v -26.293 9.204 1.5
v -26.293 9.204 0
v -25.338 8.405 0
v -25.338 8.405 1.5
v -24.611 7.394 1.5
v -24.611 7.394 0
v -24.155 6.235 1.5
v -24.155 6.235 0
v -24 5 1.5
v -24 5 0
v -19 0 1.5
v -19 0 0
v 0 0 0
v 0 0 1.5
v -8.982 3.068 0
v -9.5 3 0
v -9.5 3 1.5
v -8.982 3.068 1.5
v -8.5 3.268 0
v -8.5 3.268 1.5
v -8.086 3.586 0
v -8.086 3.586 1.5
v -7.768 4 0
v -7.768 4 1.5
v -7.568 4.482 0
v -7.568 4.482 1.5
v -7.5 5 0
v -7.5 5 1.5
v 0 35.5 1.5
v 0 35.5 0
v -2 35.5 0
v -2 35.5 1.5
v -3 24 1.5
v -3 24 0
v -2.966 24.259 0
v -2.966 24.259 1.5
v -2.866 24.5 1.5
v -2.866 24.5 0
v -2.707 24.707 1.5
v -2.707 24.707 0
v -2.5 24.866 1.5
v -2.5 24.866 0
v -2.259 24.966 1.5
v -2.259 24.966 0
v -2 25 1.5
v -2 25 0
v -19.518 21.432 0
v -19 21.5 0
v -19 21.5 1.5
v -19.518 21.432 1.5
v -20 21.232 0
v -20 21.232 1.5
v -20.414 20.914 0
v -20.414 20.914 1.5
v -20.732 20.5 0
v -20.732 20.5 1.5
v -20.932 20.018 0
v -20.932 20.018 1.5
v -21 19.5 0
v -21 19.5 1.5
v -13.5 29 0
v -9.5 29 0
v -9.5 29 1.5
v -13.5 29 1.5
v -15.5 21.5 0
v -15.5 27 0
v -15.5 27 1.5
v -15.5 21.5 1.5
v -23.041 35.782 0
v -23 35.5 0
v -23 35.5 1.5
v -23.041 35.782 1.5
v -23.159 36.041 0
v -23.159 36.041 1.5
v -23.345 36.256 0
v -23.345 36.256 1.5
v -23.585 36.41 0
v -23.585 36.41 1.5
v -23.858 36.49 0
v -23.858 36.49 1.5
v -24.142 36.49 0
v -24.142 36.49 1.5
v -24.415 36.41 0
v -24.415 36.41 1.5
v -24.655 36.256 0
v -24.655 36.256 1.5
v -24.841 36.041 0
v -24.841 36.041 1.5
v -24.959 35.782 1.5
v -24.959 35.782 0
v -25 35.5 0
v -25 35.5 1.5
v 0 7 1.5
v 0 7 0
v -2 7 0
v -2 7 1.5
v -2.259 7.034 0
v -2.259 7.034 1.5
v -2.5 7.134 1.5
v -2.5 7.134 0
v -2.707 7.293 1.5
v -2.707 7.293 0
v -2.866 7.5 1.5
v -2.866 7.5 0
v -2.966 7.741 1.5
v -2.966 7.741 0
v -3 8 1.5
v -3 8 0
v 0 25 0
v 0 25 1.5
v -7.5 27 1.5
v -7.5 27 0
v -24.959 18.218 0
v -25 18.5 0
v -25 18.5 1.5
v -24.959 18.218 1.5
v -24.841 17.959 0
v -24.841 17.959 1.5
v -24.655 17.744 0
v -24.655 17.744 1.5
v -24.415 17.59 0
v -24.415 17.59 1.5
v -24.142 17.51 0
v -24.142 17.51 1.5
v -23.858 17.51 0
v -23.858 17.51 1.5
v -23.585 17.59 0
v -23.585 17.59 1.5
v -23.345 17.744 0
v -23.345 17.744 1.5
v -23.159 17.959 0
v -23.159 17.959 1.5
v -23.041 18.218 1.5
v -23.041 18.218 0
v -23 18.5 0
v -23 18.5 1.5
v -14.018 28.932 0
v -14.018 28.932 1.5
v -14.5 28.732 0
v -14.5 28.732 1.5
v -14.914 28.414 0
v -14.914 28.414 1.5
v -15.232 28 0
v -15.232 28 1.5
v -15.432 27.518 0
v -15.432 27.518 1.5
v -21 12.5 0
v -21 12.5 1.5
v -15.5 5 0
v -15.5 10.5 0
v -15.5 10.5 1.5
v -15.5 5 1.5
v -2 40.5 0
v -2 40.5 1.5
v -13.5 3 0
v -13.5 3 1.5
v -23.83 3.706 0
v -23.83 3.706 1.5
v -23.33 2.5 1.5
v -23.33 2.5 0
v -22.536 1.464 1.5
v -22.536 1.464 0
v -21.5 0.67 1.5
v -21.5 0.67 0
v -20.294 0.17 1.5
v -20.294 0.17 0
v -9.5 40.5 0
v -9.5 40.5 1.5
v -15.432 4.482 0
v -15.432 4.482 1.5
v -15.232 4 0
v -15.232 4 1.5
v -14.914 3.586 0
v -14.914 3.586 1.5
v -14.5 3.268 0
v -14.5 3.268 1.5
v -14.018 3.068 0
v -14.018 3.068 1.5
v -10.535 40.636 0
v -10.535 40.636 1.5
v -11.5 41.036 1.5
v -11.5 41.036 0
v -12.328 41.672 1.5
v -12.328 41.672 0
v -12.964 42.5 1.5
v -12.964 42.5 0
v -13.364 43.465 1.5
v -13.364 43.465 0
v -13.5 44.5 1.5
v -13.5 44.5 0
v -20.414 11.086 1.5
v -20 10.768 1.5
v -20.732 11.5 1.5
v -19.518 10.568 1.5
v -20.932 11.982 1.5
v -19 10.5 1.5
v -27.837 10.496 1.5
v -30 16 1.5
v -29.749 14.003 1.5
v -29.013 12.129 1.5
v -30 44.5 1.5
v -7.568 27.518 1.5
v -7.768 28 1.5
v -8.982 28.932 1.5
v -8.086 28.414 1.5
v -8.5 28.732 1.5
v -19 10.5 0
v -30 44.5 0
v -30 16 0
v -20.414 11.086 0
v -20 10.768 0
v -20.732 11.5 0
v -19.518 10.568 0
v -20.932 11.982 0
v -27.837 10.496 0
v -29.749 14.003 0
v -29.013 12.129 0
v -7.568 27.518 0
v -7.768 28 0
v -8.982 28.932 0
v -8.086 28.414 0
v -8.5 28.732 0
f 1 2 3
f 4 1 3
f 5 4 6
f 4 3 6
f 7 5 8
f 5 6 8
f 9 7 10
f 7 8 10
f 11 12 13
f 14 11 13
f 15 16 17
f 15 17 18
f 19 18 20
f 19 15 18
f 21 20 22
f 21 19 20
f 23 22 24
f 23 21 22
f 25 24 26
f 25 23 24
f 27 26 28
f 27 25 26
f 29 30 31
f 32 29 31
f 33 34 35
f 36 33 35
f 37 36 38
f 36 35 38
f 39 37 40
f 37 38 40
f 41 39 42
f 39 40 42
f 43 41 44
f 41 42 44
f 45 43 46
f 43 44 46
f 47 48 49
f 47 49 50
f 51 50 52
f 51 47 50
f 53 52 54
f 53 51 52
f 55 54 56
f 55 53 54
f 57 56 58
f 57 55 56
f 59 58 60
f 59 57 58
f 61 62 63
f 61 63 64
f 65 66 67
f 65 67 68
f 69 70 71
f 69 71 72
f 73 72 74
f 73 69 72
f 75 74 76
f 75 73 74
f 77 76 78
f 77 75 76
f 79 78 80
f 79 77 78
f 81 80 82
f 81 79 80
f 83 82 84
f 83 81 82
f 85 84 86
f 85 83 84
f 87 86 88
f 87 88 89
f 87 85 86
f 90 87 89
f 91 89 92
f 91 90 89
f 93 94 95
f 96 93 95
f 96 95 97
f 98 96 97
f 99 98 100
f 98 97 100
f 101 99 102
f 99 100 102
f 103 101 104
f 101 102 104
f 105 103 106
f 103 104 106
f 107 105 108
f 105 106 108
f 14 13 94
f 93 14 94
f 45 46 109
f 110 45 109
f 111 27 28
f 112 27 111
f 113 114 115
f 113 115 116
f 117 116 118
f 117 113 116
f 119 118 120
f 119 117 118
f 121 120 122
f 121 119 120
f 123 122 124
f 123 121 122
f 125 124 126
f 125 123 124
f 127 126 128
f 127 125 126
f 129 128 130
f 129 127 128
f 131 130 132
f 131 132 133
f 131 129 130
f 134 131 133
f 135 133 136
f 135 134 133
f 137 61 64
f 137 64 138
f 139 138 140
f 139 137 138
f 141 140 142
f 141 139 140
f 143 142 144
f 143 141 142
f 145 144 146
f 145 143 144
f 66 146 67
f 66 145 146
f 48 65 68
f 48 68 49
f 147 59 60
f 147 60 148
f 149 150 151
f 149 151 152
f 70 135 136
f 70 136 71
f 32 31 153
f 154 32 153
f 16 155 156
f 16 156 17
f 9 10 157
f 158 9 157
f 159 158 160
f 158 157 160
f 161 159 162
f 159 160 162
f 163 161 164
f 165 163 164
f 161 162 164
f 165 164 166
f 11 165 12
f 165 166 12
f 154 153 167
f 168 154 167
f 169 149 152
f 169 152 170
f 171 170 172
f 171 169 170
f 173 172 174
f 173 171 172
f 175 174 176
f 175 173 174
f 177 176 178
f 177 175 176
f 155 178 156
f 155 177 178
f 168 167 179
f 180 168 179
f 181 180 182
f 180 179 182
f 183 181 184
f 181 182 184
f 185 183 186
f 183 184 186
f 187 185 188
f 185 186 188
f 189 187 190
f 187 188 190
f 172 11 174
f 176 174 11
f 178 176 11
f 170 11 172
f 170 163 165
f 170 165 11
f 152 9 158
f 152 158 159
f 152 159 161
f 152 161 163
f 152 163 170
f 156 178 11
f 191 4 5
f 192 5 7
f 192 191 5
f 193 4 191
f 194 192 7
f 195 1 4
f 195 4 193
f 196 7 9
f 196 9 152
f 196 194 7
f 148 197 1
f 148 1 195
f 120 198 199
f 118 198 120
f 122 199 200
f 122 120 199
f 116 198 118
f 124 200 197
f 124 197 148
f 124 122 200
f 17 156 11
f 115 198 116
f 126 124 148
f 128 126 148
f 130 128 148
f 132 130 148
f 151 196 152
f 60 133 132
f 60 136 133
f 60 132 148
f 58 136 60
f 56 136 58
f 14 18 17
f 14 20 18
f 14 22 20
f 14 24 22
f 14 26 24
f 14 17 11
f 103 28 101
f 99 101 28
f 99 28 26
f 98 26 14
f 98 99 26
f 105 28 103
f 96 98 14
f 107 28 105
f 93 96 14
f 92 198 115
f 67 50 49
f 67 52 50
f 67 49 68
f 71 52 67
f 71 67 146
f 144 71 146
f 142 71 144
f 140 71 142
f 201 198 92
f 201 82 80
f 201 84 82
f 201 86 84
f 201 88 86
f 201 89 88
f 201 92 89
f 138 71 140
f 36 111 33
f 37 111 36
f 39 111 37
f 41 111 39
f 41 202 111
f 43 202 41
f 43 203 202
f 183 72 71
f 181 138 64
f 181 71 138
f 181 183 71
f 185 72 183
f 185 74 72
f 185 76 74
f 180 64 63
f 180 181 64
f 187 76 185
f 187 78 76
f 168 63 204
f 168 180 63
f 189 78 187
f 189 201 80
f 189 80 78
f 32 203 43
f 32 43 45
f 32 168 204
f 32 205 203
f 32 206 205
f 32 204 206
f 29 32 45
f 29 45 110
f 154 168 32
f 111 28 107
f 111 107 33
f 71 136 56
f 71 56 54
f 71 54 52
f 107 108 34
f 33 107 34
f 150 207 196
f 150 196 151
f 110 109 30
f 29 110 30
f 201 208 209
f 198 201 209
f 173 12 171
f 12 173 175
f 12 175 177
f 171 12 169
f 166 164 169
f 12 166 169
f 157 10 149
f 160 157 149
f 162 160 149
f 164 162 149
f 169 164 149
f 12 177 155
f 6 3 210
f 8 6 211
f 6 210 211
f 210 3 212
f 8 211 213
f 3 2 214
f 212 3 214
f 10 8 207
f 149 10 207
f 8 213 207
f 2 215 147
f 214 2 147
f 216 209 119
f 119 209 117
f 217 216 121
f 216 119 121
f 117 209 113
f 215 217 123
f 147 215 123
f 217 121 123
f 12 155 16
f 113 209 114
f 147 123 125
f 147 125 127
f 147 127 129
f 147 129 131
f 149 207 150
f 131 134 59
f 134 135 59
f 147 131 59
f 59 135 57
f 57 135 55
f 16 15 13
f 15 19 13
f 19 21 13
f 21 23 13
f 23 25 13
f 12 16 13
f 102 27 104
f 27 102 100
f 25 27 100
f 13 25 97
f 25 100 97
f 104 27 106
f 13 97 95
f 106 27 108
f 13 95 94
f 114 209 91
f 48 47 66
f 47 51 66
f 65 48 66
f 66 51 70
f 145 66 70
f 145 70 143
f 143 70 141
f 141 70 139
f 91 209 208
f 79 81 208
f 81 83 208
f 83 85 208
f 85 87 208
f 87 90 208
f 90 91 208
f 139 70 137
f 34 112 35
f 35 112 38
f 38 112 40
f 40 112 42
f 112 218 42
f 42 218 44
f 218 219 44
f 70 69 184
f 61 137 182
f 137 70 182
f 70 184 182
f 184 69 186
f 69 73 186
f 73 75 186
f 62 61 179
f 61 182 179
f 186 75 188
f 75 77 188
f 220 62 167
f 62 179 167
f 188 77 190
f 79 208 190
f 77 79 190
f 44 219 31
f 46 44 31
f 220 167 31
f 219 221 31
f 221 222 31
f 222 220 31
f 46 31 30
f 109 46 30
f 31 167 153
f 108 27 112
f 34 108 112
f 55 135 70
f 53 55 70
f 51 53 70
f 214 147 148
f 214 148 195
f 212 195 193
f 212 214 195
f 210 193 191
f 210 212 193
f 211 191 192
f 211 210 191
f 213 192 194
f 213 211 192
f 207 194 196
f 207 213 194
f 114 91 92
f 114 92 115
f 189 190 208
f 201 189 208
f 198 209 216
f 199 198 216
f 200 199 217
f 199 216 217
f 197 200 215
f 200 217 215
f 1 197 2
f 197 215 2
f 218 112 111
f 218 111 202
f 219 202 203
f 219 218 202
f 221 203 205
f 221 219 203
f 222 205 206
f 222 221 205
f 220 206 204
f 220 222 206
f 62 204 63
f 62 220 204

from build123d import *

# Parameters (mm, degrees)
BOSS_EXTRUDE1_DEPTH = 1.5


with BuildPart() as part:
    # Sketch1 → Boss-Extrude1 (new body)
    with BuildSketch(Plane.XY):
        with BuildLine():
            Line((-19, 0), (0, 0))
            Line((0, 0), (0, 7))
            Line((0, 7), (-2, 7))
            ThreePointArc((-2, 7), (-2.707106781, 7.292893219), (-3, 8))
            Line((-3, 8), (-3, 24))
            ThreePointArc((-3, 24), (-2.707106781, 24.707106781), (-2, 25))
            Line((-2, 25), (0, 25))
            Line((0, 25), (0, 35.5))
            Line((0, 35.5), (-2, 35.5))
            Line((-2, 35.5), (-2, 40.5))
            Line((-2, 40.5), (-9.5, 40.5))
            ThreePointArc((-9.5, 40.5), (-12.328427125, 41.671572875), (-13.5, 44.5))
            Line((-13.5, 44.5), (-30, 44.5))
            Line((-30, 44.5), (-30, 16))
            ThreePointArc((-30, 16), (-29.012989214, 12.12927861), (-26.292993631, 9.203821656))
            ThreePointArc((-26.292993631, 9.203821656), (-24.610522135, 7.394260653), (-24, 5))
            ThreePointArc((-24, 5), (-22.535533906, 1.464466094), (-19, 0))
        make_face()
        with BuildLine():
            Line((-25, 35.5), (-25, 18.5))
            ThreePointArc((-25, 18.5), (-24, 17.5), (-23, 18.5))
            Line((-23, 18.5), (-23, 35.5))
            ThreePointArc((-23, 35.5), (-24, 36.5), (-25, 35.5))
        make_face(mode=Mode.SUBTRACT)
        with BuildLine():
            Line((-7.5, 5), (-7.5, 27))
            ThreePointArc((-7.5, 27), (-8.085786438, 28.414213562), (-9.5, 29))
            Line((-9.5, 29), (-13.5, 29))
            ThreePointArc((-13.5, 29), (-14.914213562, 28.414213562), (-15.5, 27))
            Line((-15.5, 27), (-15.5, 21.5))
            Line((-15.5, 21.5), (-19, 21.5))
            ThreePointArc((-19, 21.5), (-20.414213562, 20.914213562), (-21, 19.5))
            Line((-21, 19.5), (-21, 12.5))
            ThreePointArc((-21, 12.5), (-20.414213562, 11.085786438), (-19, 10.5))
            Line((-19, 10.5), (-15.5, 10.5))
            Line((-15.5, 10.5), (-15.5, 5))
            ThreePointArc((-15.5, 5), (-14.914213562, 3.585786438), (-13.5, 3))
            Line((-13.5, 3), (-9.5, 3))
            ThreePointArc((-9.5, 3), (-8.085786438, 3.585786438), (-7.5, 5))
        make_face(mode=Mode.SUBTRACT)
    extrude(amount=BOSS_EXTRUDE1_DEPTH)


solid = part.part
